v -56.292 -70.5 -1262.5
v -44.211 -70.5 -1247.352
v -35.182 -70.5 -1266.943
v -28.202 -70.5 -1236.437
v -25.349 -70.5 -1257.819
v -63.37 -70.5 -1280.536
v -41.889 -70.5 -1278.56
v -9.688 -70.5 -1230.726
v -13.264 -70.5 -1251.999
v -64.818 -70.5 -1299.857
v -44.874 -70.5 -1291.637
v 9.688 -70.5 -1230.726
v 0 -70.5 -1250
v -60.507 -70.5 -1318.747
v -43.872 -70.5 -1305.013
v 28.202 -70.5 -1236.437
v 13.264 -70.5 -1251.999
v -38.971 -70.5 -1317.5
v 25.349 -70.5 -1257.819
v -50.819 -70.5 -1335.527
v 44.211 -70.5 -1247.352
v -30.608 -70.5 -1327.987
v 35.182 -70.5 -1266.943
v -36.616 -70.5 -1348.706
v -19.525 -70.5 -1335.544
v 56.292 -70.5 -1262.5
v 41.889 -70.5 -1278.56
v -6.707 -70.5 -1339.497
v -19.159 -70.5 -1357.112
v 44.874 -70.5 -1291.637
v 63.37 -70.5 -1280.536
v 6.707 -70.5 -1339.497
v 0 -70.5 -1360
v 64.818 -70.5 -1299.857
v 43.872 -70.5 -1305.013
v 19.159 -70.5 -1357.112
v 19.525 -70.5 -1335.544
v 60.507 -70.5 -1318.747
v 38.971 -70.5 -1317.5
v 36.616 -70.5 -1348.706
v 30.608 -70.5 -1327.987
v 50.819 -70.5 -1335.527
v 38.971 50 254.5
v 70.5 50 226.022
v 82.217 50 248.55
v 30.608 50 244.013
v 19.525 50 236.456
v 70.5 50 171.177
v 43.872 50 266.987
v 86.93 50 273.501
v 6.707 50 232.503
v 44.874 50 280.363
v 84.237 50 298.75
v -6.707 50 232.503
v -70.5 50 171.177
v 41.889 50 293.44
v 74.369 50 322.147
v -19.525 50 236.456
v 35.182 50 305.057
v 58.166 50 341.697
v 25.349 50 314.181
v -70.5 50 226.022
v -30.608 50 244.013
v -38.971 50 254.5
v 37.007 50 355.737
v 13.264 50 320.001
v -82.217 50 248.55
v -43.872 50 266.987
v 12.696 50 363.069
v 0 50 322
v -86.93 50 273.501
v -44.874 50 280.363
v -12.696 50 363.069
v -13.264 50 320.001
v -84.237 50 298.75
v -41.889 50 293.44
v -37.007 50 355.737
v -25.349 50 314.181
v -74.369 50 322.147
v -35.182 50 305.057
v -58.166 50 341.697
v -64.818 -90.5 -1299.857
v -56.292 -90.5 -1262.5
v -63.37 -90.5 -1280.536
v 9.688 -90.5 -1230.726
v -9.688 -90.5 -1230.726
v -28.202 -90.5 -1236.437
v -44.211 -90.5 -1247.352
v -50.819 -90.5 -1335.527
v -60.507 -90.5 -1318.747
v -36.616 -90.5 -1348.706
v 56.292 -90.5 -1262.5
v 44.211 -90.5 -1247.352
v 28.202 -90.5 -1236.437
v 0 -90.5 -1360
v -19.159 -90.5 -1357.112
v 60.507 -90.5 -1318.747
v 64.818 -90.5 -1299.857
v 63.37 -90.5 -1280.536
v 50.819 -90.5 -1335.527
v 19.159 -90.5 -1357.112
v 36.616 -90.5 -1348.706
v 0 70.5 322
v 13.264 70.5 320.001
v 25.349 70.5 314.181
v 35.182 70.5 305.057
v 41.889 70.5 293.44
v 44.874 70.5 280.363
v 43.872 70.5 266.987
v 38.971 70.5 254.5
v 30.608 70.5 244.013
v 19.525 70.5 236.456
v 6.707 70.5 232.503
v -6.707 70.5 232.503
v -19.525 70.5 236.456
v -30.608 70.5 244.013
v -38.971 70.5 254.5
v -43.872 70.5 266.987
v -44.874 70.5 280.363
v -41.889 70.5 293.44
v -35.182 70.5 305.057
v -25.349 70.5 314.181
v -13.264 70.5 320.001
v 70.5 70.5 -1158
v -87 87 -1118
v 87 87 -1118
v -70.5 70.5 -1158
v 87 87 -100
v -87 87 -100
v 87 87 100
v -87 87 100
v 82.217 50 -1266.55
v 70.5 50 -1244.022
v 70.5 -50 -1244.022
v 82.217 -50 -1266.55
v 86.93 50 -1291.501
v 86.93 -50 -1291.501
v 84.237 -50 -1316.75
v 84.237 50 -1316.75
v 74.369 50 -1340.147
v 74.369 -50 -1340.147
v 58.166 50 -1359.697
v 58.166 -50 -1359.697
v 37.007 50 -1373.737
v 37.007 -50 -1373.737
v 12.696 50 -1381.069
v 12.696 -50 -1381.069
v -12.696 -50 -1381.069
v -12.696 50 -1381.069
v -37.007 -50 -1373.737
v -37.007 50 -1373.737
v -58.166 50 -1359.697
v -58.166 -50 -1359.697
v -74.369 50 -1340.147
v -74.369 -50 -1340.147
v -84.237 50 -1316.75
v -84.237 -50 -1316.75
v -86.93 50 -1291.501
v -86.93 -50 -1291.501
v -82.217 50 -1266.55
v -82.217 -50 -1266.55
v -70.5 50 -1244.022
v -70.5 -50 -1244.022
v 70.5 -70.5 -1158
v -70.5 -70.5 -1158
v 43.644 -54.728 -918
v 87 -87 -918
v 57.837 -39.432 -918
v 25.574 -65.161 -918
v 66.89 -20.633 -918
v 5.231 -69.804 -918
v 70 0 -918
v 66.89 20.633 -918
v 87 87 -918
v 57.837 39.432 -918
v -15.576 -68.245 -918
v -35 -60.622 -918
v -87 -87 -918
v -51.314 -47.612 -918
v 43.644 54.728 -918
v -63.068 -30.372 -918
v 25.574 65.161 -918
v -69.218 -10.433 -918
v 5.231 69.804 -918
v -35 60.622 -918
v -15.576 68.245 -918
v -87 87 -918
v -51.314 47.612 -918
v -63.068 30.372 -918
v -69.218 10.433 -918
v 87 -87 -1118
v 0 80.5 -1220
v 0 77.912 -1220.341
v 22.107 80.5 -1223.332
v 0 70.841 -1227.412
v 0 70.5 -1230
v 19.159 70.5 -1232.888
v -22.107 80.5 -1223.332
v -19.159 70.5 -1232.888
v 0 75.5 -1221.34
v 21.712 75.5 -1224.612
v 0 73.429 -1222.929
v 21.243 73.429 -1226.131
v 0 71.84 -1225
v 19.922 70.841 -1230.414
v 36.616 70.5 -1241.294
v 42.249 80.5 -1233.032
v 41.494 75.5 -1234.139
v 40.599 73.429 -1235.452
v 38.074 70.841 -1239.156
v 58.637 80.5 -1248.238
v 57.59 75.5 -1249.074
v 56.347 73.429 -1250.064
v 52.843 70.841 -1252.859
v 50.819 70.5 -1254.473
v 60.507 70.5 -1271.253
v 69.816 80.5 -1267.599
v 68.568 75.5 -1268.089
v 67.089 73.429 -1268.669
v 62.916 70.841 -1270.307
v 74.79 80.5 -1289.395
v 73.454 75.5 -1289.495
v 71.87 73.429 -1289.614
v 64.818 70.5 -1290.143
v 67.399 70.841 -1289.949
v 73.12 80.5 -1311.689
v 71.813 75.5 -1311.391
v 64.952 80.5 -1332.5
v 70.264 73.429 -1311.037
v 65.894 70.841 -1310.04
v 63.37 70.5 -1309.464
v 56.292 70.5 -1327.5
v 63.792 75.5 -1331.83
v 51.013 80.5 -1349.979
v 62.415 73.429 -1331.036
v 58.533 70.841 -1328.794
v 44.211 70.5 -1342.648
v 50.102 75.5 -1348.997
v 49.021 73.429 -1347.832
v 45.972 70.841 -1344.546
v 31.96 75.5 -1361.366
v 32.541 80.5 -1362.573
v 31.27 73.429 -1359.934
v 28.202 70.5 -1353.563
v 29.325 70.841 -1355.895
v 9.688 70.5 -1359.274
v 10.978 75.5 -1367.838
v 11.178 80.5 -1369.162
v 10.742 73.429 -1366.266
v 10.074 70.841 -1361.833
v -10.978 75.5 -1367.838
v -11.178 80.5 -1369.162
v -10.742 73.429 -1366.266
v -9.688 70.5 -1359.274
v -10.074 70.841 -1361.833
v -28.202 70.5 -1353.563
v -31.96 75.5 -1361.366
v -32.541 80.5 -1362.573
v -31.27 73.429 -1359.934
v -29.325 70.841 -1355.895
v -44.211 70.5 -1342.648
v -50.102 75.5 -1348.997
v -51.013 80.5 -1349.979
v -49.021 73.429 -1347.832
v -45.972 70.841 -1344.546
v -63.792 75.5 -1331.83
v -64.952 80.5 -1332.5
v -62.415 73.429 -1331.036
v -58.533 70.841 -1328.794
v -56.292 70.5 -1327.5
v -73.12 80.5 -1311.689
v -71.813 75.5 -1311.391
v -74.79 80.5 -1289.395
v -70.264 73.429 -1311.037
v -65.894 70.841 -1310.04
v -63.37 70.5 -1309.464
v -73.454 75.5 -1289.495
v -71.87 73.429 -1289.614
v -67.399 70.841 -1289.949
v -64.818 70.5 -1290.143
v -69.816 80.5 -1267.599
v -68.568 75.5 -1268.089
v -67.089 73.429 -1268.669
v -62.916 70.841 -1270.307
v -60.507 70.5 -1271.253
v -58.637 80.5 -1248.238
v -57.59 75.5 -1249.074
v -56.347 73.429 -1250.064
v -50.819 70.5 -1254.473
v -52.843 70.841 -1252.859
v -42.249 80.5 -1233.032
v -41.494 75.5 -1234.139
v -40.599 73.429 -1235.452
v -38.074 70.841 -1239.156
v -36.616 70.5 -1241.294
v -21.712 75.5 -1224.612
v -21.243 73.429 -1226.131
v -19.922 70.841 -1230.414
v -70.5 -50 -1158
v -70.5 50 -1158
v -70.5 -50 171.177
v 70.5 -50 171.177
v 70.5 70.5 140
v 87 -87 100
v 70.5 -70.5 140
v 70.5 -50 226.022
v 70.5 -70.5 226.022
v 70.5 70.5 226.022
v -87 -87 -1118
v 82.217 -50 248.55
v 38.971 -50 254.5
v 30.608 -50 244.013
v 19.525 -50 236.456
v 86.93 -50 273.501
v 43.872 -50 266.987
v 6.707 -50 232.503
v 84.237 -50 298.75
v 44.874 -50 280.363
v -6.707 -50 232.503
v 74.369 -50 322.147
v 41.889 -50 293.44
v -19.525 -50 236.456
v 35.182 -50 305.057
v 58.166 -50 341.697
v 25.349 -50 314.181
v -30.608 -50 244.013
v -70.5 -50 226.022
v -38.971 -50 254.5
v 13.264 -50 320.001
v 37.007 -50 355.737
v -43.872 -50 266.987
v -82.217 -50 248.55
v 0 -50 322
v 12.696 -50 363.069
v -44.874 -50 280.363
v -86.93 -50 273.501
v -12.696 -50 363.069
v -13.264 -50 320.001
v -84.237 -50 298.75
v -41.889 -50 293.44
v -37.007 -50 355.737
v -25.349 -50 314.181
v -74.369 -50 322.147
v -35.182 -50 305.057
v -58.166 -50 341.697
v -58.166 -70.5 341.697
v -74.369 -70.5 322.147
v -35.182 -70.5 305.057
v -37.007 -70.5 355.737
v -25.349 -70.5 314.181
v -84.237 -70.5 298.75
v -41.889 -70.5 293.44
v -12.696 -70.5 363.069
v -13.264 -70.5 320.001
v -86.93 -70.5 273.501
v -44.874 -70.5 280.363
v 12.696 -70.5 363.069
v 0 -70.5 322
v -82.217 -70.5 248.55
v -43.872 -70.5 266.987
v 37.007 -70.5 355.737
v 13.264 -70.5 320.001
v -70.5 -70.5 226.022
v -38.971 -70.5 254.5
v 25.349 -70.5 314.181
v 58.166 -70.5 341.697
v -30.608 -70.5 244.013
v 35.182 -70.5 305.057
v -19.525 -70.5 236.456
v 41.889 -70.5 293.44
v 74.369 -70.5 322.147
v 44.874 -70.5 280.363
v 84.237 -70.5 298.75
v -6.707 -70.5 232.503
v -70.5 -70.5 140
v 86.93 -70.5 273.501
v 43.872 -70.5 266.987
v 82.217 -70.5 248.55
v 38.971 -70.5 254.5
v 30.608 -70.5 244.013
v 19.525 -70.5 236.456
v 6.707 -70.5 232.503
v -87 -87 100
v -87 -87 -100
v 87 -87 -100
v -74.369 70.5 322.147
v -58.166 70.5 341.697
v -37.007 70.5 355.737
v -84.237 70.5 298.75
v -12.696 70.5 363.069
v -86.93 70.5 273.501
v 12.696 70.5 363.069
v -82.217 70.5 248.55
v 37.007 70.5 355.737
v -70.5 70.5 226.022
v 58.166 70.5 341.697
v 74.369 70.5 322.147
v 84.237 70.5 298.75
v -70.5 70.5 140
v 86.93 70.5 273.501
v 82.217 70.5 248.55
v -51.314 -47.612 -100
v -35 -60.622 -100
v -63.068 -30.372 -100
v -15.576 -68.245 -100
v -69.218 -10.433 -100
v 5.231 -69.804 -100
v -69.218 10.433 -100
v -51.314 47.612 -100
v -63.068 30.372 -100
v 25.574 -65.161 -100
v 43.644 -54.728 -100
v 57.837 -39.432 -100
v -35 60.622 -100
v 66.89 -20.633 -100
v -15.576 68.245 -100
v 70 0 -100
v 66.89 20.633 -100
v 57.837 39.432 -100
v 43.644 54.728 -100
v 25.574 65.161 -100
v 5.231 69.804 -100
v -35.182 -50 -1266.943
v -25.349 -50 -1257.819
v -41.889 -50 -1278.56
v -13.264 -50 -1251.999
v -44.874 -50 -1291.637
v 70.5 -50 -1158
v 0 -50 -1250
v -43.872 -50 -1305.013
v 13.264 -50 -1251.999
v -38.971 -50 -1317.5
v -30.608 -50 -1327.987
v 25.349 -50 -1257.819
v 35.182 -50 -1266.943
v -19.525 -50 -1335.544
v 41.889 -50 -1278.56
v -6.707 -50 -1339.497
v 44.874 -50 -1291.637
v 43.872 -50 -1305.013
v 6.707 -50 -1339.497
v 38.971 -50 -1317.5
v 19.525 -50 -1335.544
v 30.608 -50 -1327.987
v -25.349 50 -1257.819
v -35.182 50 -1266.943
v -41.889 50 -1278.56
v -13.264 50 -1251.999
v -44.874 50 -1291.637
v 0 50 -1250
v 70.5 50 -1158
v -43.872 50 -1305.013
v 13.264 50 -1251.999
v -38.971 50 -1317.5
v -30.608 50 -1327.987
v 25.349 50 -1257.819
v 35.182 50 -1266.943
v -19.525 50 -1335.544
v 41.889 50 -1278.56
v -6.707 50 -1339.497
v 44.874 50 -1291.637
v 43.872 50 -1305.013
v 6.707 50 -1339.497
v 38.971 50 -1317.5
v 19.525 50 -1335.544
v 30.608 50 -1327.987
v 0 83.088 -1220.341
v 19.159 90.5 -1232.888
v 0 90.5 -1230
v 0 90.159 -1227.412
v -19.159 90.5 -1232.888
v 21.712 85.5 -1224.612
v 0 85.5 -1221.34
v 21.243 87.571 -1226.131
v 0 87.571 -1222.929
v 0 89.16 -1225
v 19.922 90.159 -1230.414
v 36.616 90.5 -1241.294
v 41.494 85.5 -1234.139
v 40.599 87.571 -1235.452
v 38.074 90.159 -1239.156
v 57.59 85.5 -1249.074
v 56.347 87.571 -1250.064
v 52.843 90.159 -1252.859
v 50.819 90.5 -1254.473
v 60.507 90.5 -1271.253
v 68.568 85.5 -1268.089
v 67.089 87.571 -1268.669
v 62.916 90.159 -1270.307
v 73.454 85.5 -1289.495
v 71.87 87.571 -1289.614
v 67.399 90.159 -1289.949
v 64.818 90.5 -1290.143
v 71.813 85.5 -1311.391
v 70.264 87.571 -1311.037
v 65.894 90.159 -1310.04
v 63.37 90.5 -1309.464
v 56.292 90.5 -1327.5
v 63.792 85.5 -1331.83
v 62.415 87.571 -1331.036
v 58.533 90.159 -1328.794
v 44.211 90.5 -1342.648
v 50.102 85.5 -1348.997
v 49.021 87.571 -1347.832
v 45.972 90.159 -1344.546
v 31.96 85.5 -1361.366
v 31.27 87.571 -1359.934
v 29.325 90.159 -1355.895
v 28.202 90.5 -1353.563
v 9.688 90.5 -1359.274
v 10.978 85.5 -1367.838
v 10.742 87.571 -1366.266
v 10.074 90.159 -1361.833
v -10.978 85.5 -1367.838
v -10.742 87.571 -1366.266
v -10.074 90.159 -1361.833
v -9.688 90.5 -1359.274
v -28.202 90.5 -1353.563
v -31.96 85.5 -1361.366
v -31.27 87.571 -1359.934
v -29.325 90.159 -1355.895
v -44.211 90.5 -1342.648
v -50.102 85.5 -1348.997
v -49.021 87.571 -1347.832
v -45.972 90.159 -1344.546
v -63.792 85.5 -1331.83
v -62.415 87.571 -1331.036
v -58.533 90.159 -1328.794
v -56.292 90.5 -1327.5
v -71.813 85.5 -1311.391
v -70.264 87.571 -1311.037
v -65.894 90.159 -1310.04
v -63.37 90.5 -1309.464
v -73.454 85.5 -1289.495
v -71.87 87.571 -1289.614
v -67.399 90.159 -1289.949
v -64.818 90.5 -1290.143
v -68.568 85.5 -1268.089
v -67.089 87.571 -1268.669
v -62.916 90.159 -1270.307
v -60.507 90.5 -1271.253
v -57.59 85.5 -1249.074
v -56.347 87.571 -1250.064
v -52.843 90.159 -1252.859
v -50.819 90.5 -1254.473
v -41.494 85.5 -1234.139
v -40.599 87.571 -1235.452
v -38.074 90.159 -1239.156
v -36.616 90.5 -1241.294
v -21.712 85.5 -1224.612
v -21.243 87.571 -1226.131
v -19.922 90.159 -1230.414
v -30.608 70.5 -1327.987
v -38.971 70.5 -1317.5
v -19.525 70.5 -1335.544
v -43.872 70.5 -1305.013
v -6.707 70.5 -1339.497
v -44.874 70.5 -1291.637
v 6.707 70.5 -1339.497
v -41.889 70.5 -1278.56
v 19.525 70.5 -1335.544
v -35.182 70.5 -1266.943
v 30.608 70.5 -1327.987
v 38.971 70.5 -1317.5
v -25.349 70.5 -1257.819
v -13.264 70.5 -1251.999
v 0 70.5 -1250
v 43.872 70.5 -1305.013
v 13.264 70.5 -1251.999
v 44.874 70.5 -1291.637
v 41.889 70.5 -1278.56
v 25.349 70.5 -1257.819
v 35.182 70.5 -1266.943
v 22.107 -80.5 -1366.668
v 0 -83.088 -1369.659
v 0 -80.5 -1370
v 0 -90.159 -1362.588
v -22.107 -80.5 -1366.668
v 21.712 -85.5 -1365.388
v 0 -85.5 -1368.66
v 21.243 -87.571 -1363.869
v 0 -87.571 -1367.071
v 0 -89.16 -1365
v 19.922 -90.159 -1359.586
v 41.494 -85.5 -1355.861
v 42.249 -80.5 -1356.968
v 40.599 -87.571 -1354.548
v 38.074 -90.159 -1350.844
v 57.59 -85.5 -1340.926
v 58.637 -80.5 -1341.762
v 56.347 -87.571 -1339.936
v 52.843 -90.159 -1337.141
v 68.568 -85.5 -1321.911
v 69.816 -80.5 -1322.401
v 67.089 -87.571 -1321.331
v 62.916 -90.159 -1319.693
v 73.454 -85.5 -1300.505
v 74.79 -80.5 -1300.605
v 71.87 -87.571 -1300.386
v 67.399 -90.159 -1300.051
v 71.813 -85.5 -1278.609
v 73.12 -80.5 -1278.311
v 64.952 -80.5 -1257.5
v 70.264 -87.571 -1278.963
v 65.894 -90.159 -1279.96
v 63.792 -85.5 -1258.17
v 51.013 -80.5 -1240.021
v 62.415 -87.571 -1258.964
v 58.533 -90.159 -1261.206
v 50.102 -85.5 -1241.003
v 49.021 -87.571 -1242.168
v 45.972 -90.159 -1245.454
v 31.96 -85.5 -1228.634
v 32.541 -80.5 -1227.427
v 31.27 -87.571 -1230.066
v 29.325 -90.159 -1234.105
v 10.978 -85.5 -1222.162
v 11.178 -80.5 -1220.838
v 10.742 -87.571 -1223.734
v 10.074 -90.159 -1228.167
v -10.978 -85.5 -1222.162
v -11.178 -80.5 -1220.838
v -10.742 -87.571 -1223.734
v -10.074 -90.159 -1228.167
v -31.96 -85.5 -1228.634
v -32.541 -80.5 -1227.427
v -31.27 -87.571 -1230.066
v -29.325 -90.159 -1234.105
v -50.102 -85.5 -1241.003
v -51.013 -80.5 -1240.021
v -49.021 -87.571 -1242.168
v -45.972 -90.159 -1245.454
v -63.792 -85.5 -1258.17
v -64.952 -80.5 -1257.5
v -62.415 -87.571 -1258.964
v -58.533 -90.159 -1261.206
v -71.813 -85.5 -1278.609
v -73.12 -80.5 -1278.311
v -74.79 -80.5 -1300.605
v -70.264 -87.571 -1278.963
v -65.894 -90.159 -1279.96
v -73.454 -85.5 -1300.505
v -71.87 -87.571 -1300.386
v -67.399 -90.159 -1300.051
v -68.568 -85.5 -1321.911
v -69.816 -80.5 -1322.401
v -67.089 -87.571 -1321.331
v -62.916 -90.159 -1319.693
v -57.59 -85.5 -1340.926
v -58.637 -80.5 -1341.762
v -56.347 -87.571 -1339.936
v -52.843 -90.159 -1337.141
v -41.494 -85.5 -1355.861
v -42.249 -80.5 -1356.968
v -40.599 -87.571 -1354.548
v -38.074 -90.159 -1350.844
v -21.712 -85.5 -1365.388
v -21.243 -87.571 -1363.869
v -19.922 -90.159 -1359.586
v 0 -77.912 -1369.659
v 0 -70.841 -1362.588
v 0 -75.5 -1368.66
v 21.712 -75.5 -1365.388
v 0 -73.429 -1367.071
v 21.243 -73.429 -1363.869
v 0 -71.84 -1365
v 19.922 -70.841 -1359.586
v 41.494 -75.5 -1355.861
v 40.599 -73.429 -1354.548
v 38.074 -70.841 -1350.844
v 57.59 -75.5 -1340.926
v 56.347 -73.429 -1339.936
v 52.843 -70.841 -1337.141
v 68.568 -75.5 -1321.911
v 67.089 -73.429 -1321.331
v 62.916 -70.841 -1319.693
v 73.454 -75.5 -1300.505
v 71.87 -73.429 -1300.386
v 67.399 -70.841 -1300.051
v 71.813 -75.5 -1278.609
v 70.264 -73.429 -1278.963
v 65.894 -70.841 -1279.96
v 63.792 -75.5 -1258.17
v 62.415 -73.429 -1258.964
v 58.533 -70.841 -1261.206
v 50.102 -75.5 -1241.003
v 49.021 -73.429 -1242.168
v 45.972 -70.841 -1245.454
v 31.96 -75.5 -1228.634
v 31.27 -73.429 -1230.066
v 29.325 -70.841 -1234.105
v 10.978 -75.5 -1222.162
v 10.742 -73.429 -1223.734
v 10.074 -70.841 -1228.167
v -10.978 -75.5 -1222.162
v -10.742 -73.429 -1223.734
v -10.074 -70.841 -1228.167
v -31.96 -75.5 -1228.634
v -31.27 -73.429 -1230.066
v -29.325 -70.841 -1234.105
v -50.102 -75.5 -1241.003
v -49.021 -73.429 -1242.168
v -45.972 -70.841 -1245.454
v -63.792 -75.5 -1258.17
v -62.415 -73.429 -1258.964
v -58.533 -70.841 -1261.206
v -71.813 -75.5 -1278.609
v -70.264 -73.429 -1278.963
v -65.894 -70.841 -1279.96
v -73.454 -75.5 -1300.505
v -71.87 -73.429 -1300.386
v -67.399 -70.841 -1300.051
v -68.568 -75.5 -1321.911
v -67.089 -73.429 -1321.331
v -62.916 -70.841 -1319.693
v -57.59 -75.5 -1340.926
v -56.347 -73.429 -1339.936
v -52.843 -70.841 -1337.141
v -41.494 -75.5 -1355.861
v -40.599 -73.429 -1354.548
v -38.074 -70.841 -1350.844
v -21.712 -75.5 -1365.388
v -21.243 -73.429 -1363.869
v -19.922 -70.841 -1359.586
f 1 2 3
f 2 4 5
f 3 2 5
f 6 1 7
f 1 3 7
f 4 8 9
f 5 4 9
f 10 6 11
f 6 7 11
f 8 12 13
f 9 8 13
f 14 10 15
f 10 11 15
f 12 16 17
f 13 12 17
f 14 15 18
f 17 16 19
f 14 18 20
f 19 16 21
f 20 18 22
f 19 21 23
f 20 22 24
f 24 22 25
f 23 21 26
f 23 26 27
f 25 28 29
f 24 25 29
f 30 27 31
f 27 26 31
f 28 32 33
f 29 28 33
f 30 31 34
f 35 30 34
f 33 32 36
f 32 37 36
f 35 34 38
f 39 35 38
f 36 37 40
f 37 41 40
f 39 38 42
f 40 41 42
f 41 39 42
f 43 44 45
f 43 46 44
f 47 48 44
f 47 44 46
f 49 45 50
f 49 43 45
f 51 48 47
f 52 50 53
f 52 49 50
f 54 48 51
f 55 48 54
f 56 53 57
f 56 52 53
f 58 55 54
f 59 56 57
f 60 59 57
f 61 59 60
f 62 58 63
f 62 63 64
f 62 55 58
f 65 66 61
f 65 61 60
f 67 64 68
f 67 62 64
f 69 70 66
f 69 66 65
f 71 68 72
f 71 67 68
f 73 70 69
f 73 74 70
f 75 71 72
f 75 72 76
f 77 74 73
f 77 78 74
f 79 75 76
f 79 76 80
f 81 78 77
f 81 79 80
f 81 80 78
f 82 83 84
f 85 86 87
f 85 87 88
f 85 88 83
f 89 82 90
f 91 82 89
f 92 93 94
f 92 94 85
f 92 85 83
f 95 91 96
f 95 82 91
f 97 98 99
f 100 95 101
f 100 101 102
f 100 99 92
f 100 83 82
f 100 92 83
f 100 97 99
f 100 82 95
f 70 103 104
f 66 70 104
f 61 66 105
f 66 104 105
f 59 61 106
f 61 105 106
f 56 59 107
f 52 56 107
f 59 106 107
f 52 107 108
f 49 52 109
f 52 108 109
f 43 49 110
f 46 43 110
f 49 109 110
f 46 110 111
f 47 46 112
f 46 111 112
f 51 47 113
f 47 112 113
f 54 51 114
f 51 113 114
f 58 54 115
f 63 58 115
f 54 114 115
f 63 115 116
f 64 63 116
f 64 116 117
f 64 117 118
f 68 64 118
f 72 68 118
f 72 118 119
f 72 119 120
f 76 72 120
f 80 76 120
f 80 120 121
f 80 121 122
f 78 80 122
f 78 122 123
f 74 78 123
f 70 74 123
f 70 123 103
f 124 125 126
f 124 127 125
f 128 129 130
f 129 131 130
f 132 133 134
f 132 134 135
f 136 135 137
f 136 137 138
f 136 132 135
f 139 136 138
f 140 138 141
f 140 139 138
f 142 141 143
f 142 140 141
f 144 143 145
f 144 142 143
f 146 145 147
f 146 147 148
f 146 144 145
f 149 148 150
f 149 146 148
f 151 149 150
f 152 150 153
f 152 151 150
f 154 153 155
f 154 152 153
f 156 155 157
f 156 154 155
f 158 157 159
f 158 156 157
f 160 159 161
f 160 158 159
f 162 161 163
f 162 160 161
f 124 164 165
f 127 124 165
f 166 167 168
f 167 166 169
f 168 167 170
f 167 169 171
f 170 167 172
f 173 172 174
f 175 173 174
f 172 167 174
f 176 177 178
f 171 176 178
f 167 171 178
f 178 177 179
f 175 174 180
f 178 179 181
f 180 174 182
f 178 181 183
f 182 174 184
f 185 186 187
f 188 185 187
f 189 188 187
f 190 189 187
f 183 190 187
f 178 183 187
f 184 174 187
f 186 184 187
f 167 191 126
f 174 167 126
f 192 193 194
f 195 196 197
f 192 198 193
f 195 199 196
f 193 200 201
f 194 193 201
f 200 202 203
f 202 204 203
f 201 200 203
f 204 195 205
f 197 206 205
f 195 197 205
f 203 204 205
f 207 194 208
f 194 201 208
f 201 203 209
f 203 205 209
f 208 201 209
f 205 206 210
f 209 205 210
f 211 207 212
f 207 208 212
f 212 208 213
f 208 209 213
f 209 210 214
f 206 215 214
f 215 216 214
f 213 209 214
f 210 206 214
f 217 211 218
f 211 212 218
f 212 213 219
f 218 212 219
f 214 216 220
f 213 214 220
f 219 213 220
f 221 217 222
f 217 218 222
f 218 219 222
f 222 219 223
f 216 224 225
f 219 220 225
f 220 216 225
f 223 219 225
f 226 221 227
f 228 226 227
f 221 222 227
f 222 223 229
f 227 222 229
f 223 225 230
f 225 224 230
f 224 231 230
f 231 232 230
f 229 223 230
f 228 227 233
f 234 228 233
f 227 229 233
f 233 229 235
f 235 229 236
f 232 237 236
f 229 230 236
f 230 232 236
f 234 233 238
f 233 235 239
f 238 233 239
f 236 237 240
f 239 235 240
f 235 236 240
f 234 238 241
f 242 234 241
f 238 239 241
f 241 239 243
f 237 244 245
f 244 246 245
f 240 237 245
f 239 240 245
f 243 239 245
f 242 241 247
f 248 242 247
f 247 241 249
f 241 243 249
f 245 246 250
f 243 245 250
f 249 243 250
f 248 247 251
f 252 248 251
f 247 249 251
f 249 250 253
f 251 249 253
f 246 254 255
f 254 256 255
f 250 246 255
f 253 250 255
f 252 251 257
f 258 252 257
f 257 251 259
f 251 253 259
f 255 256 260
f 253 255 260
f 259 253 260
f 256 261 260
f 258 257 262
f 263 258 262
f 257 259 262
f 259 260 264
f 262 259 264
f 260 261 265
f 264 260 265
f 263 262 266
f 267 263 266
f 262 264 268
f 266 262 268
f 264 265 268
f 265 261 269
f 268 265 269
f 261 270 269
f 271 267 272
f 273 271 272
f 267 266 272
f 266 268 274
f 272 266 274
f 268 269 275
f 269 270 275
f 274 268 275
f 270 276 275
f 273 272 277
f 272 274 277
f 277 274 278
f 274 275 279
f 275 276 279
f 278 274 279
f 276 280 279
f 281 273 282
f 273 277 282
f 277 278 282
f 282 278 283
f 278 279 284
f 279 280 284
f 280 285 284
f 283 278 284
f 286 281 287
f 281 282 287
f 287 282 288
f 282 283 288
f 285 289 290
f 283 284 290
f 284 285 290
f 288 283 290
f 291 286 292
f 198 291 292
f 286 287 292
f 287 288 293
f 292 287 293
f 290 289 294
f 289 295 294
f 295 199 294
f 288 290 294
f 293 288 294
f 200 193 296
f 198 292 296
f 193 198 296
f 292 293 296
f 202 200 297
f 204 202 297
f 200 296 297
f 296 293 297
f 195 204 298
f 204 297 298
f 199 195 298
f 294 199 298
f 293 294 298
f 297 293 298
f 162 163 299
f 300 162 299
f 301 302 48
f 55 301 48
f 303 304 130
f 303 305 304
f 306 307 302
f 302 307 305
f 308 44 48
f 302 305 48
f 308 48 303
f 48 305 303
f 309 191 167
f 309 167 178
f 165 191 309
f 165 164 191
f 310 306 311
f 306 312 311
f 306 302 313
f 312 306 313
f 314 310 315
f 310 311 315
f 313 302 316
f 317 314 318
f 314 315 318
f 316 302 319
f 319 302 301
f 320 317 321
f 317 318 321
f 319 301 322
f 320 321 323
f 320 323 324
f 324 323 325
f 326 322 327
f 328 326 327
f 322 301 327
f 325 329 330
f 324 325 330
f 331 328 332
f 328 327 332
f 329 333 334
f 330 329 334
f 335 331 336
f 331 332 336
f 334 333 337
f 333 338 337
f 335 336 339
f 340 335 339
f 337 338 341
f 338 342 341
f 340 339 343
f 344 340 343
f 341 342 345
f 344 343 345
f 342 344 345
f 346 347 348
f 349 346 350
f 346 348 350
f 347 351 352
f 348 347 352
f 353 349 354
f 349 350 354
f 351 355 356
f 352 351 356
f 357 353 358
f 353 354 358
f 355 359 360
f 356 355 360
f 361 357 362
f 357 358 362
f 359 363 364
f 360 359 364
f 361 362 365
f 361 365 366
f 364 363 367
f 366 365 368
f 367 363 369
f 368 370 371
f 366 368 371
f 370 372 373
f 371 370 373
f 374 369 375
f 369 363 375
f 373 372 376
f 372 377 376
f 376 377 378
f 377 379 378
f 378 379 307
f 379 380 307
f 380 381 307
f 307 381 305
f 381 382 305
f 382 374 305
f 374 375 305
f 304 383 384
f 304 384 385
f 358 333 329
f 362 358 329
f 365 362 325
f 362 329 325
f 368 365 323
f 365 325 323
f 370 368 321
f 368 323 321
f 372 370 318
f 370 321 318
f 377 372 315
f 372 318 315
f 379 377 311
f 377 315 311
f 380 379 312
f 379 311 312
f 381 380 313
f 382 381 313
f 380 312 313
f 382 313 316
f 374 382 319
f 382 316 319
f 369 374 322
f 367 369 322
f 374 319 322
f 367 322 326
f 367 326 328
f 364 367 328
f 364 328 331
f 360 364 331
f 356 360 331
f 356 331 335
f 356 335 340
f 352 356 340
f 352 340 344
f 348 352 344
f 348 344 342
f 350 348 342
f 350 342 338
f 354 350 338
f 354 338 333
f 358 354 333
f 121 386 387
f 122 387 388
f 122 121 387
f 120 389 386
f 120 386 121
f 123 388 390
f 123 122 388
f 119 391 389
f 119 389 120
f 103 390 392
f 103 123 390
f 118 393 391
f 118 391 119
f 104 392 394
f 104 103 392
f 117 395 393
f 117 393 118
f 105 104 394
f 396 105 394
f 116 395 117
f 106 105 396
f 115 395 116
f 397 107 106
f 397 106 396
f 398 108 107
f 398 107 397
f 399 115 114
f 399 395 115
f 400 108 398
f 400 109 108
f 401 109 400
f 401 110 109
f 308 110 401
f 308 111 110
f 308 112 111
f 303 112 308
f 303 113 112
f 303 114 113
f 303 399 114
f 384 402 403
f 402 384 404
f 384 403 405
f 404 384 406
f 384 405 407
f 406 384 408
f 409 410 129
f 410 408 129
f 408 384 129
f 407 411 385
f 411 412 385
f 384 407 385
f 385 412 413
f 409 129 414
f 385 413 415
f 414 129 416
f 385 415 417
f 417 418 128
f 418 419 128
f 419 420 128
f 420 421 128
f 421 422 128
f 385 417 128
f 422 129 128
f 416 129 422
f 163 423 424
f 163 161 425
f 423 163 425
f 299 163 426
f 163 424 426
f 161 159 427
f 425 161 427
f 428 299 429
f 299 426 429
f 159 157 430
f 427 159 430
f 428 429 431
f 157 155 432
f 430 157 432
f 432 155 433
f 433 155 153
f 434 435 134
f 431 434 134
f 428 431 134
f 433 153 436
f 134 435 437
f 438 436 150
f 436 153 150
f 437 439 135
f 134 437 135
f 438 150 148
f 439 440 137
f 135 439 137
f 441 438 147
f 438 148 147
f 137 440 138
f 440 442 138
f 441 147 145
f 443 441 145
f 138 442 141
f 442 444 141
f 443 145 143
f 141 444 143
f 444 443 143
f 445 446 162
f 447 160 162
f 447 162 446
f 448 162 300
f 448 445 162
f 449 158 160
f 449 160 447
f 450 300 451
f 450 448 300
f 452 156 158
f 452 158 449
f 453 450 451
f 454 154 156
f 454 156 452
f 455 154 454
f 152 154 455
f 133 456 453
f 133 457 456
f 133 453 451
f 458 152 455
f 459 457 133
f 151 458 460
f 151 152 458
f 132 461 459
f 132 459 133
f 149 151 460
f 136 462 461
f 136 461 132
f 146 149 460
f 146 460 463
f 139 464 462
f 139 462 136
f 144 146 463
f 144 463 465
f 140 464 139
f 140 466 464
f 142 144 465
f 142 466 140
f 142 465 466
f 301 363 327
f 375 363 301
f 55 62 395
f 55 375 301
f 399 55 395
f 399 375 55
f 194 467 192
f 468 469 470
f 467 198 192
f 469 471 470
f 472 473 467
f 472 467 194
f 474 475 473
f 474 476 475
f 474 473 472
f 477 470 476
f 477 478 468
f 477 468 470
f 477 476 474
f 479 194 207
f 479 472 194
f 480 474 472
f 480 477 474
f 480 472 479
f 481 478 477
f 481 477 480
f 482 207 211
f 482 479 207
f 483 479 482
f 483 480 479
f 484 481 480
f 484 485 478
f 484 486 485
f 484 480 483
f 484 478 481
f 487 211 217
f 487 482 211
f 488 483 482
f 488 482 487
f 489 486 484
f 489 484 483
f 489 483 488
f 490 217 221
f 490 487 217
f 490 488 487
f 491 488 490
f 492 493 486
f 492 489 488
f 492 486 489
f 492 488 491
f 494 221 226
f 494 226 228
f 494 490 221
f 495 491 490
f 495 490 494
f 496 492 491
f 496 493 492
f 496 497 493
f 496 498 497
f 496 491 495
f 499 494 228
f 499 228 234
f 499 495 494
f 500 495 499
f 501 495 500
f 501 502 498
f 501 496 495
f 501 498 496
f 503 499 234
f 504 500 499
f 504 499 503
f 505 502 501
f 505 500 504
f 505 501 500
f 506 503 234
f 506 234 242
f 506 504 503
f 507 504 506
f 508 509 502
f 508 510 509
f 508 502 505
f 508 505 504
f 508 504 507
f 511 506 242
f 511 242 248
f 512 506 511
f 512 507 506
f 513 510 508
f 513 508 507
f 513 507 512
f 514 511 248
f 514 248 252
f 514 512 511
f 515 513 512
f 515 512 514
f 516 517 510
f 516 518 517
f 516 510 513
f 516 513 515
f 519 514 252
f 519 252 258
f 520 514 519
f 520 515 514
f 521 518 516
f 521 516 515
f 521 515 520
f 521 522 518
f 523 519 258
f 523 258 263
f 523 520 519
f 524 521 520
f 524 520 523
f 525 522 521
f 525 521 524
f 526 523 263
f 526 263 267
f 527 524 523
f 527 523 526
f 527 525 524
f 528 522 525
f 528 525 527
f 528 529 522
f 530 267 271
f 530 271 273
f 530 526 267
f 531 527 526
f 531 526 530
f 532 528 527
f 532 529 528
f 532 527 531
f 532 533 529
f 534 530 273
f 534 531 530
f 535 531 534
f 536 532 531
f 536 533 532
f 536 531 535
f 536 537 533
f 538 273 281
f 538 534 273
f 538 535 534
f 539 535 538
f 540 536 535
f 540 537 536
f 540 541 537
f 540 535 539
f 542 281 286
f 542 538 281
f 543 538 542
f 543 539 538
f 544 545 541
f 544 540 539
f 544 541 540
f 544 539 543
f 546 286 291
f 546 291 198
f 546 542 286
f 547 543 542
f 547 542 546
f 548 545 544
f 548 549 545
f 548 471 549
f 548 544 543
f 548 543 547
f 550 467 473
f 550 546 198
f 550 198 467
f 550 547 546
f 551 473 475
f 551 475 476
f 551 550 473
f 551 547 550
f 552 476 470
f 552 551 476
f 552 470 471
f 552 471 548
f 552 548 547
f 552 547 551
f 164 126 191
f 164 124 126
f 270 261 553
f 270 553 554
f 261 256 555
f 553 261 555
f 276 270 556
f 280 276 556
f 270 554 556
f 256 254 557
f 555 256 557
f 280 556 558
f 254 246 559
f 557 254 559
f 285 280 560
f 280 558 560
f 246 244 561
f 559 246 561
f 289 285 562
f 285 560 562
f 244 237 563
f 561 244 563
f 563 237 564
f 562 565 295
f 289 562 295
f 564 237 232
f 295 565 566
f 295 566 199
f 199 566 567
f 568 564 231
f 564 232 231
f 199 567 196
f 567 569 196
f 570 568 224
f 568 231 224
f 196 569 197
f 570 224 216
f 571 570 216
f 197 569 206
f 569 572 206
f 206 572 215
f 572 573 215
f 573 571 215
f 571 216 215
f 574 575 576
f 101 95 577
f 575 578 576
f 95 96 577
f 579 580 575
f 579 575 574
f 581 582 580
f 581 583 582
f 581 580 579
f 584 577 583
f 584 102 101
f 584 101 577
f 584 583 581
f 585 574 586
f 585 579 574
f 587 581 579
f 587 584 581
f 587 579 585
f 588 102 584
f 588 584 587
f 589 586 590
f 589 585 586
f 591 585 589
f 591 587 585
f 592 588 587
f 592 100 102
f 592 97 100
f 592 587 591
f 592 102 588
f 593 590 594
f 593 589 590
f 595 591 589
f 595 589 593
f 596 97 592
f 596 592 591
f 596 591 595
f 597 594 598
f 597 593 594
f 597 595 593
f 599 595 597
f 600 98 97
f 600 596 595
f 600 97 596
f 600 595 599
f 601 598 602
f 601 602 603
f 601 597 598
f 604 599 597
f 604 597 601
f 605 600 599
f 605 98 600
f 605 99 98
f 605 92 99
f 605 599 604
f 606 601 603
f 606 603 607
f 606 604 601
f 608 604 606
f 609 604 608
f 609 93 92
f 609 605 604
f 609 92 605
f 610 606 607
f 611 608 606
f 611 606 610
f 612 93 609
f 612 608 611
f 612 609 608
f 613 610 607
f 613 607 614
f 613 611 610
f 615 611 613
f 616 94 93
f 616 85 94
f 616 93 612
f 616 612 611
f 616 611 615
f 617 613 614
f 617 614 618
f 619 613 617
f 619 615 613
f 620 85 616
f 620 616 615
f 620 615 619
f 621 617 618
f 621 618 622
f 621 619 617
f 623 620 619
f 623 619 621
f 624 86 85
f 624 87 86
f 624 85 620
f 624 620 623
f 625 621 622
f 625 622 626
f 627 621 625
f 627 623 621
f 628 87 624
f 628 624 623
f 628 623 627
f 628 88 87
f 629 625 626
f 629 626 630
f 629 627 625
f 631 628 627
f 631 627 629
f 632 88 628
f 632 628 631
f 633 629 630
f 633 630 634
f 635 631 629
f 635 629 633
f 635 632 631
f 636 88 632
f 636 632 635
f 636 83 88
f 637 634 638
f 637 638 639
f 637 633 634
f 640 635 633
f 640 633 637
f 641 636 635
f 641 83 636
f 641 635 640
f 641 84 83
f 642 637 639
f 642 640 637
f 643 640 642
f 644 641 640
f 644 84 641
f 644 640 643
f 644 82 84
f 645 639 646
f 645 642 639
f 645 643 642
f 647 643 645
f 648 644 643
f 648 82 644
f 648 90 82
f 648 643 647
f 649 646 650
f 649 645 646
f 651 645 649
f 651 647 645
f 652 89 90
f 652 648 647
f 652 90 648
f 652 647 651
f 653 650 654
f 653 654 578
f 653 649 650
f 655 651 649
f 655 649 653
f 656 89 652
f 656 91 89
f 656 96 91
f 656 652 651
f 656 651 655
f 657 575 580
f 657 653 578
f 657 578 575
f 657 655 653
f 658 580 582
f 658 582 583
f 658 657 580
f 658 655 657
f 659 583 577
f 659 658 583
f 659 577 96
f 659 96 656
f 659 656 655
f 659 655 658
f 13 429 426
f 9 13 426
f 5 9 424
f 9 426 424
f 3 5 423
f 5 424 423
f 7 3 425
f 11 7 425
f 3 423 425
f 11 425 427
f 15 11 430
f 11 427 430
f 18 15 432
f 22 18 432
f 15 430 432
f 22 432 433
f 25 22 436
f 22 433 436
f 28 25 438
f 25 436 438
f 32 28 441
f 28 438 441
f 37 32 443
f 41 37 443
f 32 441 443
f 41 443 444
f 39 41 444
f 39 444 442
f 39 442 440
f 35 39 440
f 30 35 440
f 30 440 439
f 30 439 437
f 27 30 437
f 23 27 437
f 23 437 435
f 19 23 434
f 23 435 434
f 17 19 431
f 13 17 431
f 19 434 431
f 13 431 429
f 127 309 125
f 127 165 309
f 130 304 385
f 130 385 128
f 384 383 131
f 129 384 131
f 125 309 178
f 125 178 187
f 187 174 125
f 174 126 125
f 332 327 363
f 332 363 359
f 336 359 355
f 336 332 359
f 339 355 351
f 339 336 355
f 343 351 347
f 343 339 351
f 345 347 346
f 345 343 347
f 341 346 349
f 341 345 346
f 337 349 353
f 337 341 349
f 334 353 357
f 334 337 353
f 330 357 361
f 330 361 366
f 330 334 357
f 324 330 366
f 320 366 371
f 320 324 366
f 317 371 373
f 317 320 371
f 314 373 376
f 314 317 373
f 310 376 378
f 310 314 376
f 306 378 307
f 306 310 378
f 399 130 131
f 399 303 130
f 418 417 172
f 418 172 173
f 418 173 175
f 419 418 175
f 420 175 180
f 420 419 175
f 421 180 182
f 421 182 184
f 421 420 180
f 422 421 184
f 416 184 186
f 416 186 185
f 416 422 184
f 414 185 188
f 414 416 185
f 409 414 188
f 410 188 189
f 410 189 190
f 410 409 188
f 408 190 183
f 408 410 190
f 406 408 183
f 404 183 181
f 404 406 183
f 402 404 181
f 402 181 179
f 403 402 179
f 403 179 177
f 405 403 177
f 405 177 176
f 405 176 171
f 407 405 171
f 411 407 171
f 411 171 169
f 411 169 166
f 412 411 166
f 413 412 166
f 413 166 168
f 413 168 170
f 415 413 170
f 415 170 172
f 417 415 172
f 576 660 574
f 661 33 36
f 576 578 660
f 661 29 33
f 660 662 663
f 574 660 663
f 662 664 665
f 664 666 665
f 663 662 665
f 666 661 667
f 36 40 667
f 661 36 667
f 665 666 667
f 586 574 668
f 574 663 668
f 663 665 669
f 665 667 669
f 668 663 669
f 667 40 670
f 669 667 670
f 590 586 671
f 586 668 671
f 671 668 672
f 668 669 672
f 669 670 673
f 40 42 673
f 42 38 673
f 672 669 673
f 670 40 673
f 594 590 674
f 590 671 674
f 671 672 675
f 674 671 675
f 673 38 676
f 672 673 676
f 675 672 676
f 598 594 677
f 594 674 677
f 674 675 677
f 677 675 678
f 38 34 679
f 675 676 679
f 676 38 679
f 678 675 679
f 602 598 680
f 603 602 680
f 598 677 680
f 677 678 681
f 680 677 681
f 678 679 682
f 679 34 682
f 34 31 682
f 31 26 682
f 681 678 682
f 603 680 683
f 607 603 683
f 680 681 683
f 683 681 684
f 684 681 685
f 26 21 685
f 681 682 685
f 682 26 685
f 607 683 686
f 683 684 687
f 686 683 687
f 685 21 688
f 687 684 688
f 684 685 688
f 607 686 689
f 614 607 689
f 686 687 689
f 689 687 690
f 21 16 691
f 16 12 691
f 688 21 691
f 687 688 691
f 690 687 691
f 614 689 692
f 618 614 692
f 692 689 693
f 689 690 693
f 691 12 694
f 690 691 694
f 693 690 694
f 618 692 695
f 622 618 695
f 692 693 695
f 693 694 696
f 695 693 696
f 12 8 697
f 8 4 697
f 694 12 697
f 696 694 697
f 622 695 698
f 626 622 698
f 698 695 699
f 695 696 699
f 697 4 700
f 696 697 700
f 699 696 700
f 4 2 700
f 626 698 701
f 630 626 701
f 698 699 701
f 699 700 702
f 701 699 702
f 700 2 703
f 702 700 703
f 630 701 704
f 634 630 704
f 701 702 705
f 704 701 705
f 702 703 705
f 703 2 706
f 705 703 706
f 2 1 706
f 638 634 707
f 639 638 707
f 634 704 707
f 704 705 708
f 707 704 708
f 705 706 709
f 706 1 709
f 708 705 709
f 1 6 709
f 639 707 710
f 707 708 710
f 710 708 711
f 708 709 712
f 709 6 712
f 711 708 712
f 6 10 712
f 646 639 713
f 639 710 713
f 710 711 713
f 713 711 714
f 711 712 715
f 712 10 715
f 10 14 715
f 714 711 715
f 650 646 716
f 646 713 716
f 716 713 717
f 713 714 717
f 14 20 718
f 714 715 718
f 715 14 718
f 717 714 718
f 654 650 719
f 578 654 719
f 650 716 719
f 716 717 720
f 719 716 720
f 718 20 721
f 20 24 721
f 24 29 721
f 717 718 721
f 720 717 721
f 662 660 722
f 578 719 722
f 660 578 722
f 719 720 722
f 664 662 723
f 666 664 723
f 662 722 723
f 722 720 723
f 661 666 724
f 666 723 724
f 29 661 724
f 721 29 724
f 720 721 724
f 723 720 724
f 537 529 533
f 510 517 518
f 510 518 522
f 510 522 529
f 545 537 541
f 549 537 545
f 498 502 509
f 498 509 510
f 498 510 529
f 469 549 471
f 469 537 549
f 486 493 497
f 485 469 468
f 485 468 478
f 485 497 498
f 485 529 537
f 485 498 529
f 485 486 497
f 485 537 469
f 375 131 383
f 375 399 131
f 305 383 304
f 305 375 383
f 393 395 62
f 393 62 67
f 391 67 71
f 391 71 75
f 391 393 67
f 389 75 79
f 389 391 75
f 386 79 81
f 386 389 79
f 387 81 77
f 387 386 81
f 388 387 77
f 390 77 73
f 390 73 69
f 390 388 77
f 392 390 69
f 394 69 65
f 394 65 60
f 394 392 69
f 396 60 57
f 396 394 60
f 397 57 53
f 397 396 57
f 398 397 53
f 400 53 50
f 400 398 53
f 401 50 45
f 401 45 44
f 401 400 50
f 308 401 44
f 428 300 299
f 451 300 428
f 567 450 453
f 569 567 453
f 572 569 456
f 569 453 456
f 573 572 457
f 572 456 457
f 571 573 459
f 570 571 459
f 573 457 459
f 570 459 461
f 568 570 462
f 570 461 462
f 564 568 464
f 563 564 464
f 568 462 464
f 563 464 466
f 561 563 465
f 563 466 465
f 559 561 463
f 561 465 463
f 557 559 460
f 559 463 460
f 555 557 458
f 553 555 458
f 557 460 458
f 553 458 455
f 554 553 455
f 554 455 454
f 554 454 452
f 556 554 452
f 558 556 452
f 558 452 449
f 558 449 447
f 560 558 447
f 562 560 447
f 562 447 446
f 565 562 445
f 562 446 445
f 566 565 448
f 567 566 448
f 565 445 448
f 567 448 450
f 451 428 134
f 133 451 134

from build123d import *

# Parameters (mm, degrees)
SKETCH2_R                = 70
BOSS_EXTRUDE2_DEPTH      = 1018
SKETCH4_W                = 174
SKETCH4_H                = 174
BOSS_EXTRUDE3_DEPTH      = 100
SKETCH7_W                = 174
SKETCH7_H                = 174
BOSS_EXTRUDE4_DEPTH      = 100
SKETCH14_R               = 87
BOSS_EXTRUDE5_DEPTH      = 141
SKETCH16_R               = 45
CUT_EXTRUDE1_DEPTH       = 141
BOSS_EXTRUDE6_REACH      = 1305.818
BOSS_EXTRUDE6_END_RADIUS = 87
SKETCH17_W               = 141
SKETCH17_H               = 141
SKETCH23_W               = 196.221845396
SKETCH23_H               = 100
CUT_EXTRUDE2_DEPTH       = 201
BOSS_EXTRUDE7_DEPTH      = 50
SKETCH26_R               = 45
BOSS_EXTRUDE8_DEPTH      = 20.5
SKETCH27_R               = 45
BOSS_EXTRUDE9_DEPTH      = 20.5
SKETCH28_R               = 75
BOSS_EXTRUDE10_DEPTH     = 20
FILLET1_R                = 10
SKETCH29_R               = 75
BOSS_EXTRUDE11_DEPTH     = 20
FILLET2_R                = 10


with BuildPart() as part:
    # Sketch2 → Boss-Extrude2 (new body)
    with BuildSketch(Plane.XY):
        Circle(SKETCH2_R)
    extrude(amount=-BOSS_EXTRUDE2_DEPTH)

    # Sketch4 → Boss-Extrude3 (add, symmetric)
    with BuildSketch(Plane.XY):
        Rectangle(SKETCH4_W, SKETCH4_H)
    extrude(amount=BOSS_EXTRUDE3_DEPTH, both=True)

    # Sketch7 → Boss-Extrude4 (add, symmetric)
    with BuildSketch(Plane(origin=(0, 0, -1018), x_dir=(-1, 0, 0), z_dir=(0, 0, -1))):
        Rectangle(SKETCH7_W, SKETCH7_H)
    extrude(amount=BOSS_EXTRUDE4_DEPTH, both=True)

    # Sketch8 → section 1 of loft1
    with BuildSketch(Plane.XY.offset(140), mode=Mode.PRIVATE) as loft1_s1:
        with BuildLine():
            Line((-70.5, 70.5), (70.5, 70.5))
            Line((70.5, 70.5), (70.5, -70.5))
            Line((70.5, -70.5), (-70.5, -70.5))
            Line((-70.5, -70.5), (-70.5, 70.5))
        make_face()
    # loft from a face of the part (loft1)
    loft([part.faces().sort_by_distance((0, 0, 100))[0], loft1_s1.sketch])

    # Sketch10 → section 1 of loft8
    with BuildSketch(Plane(origin=(0, 0, -1158), x_dir=(-1, 0, 0), z_dir=(0, 0, -1)), mode=Mode.PRIVATE) as loft8_s1:
        with BuildLine():
            Line((-70.5, 70.5), (70.5, 70.5))
            Line((70.5, 70.5), (70.5, -70.5))
            Line((70.5, -70.5), (-70.5, -70.5))
            Line((-70.5, -70.5), (-70.5, 70.5))
        make_face()
    # loft from a face of the part (loft8)
    loft([part.faces().sort_by_distance((0, 0, -1118))[0], loft8_s1.sketch])



with BuildPart() as body_2:
    # Sketch14 → Boss-Extrude5 (new body)
    with BuildSketch(Plane(origin=(0, 70.5, 0), x_dir=(-1, 0, 0), z_dir=(0, 1, 0))):
        with Locations(Location((0, 277, 0), (0, 0, 90))):
            Circle(SKETCH14_R)
    extrude(amount=-BOSS_EXTRUDE5_DEPTH)

    # Sketch16 → Cut-Extrude1 (cut)
    with BuildSketch(Plane(origin=(0, 70.5, 0), x_dir=(1, 0, 0), z_dir=(0, 1, 0))):
        with Locations(Location((0, -277, 0), (0, 0, 270))):
            Circle(SKETCH16_R)
    extrude(amount=-CUT_EXTRUDE1_DEPTH, mode=Mode.SUBTRACT)


with BuildPart() as part_1:
    add(part.part)

    add(body_2.part)  # Boss-Extrude6 merges body 2
    # Boss-Extrude6: up to this cylinder (the profile starts outside it)
    boss_extrude6_end = Plane(origin=(0, 0, 277), z_dir=(0, 1, 0)) * Cylinder(BOSS_EXTRUDE6_END_RADIUS, 2786.636, mode=Mode.PRIVATE)
    # Sketch17 → Boss-Extrude6 (add, up to the surface)
    with BuildSketch(Plane.XY.offset(140), mode=Mode.PRIVATE) as boss_extrude6_sk1:
        Rectangle(SKETCH17_W, SKETCH17_H)
    boss_extrude6_tool1 = extrude(boss_extrude6_sk1.sketch, amount=BOSS_EXTRUDE6_REACH, mode=Mode.PRIVATE) - boss_extrude6_end
    add(boss_extrude6_tool1.solids().sort_by_distance((0, 0, 140))[0])

    # Sketch23 → Cut-Extrude2 (cut)
    with BuildSketch(Plane.ZY.offset(94.5)):
        with Locations((269.287462291, 0)):
            Rectangle(SKETCH23_W, SKETCH23_H)
    extrude(amount=-CUT_EXTRUDE2_DEPTH, mode=Mode.SUBTRACT)


with BuildPart() as body_2_2:
    # Sketch24 → Boss-Extrude7 (new, symmetric)
    with BuildSketch(Plane(origin=(0, 0, 0), x_dir=(1, 0, 0), z_dir=(0, 1, 0))):
        with BuildLine():
            Line((-70.5, 1158), (70.5, 1158))
            Line((70.5, 1158), (70.5, 1244.022063596))
            ThreePointArc((70.5, 1244.022063596), (0, 1382), (-70.5, 1244.022063596))
            Line((-70.5, 1244.022063596), (-70.5, 1158))
        make_face()
    extrude(amount=BOSS_EXTRUDE7_DEPTH, both=True)

    # Sketch26 → Boss-Extrude8 (add)
    with BuildSketch(Plane(origin=(0, 50, 0), x_dir=(1, 0, 0), z_dir=(0, 1, 0))):
        with Locations(Location((0, 1295, 0), (0, 0, 270))):
            Circle(SKETCH26_R)
    extrude(amount=BOSS_EXTRUDE8_DEPTH)

    # Sketch27 → Boss-Extrude9 (add)
    with BuildSketch(Plane.XZ.offset(50)):
        with Locations(Location((0, -1295, 0), (0, 0, 90))):
            Circle(SKETCH27_R)
    extrude(amount=BOSS_EXTRUDE9_DEPTH)

    # Sketch28 → Boss-Extrude10 (add)
    with BuildSketch(Plane.XZ.offset(70.5)):
        with Locations(Location((0, -1295, 0), (0, 0, 270))):
            Circle(SKETCH28_R)
    extrude(amount=BOSS_EXTRUDE10_DEPTH)

    # Fillet1
    fillet1_edges = [body_2_2.edges().sort_by_distance(p)[0] for p in [
        (0, -70.5, -1220),
        (0, -90.5, -1220),
    ]]
    fillet(fillet1_edges, radius=FILLET1_R - 0.0001)  # a hair under: the kernel refuses the full size

    # Sketch29 → Boss-Extrude11 (add)
    with BuildSketch(Plane(origin=(0, 70.5, 0), x_dir=(1, 0, 0), z_dir=(0, 1, 0))):
        with Locations(Location((0, 1295, 0), (0, 0, 270))):
            Circle(SKETCH29_R)
    extrude(amount=BOSS_EXTRUDE11_DEPTH)

    # Fillet2
    fillet2_edges = [body_2_2.edges().sort_by_distance(p)[0] for p in [
        (0, 70.5, -1370),
        (0, 90.5, -1370),
    ]]
    fillet(fillet2_edges, radius=FILLET2_R - 0.0001)  # a hair under: the kernel refuses the full size


solid = Compound([part_1.part, body_2_2.part])
